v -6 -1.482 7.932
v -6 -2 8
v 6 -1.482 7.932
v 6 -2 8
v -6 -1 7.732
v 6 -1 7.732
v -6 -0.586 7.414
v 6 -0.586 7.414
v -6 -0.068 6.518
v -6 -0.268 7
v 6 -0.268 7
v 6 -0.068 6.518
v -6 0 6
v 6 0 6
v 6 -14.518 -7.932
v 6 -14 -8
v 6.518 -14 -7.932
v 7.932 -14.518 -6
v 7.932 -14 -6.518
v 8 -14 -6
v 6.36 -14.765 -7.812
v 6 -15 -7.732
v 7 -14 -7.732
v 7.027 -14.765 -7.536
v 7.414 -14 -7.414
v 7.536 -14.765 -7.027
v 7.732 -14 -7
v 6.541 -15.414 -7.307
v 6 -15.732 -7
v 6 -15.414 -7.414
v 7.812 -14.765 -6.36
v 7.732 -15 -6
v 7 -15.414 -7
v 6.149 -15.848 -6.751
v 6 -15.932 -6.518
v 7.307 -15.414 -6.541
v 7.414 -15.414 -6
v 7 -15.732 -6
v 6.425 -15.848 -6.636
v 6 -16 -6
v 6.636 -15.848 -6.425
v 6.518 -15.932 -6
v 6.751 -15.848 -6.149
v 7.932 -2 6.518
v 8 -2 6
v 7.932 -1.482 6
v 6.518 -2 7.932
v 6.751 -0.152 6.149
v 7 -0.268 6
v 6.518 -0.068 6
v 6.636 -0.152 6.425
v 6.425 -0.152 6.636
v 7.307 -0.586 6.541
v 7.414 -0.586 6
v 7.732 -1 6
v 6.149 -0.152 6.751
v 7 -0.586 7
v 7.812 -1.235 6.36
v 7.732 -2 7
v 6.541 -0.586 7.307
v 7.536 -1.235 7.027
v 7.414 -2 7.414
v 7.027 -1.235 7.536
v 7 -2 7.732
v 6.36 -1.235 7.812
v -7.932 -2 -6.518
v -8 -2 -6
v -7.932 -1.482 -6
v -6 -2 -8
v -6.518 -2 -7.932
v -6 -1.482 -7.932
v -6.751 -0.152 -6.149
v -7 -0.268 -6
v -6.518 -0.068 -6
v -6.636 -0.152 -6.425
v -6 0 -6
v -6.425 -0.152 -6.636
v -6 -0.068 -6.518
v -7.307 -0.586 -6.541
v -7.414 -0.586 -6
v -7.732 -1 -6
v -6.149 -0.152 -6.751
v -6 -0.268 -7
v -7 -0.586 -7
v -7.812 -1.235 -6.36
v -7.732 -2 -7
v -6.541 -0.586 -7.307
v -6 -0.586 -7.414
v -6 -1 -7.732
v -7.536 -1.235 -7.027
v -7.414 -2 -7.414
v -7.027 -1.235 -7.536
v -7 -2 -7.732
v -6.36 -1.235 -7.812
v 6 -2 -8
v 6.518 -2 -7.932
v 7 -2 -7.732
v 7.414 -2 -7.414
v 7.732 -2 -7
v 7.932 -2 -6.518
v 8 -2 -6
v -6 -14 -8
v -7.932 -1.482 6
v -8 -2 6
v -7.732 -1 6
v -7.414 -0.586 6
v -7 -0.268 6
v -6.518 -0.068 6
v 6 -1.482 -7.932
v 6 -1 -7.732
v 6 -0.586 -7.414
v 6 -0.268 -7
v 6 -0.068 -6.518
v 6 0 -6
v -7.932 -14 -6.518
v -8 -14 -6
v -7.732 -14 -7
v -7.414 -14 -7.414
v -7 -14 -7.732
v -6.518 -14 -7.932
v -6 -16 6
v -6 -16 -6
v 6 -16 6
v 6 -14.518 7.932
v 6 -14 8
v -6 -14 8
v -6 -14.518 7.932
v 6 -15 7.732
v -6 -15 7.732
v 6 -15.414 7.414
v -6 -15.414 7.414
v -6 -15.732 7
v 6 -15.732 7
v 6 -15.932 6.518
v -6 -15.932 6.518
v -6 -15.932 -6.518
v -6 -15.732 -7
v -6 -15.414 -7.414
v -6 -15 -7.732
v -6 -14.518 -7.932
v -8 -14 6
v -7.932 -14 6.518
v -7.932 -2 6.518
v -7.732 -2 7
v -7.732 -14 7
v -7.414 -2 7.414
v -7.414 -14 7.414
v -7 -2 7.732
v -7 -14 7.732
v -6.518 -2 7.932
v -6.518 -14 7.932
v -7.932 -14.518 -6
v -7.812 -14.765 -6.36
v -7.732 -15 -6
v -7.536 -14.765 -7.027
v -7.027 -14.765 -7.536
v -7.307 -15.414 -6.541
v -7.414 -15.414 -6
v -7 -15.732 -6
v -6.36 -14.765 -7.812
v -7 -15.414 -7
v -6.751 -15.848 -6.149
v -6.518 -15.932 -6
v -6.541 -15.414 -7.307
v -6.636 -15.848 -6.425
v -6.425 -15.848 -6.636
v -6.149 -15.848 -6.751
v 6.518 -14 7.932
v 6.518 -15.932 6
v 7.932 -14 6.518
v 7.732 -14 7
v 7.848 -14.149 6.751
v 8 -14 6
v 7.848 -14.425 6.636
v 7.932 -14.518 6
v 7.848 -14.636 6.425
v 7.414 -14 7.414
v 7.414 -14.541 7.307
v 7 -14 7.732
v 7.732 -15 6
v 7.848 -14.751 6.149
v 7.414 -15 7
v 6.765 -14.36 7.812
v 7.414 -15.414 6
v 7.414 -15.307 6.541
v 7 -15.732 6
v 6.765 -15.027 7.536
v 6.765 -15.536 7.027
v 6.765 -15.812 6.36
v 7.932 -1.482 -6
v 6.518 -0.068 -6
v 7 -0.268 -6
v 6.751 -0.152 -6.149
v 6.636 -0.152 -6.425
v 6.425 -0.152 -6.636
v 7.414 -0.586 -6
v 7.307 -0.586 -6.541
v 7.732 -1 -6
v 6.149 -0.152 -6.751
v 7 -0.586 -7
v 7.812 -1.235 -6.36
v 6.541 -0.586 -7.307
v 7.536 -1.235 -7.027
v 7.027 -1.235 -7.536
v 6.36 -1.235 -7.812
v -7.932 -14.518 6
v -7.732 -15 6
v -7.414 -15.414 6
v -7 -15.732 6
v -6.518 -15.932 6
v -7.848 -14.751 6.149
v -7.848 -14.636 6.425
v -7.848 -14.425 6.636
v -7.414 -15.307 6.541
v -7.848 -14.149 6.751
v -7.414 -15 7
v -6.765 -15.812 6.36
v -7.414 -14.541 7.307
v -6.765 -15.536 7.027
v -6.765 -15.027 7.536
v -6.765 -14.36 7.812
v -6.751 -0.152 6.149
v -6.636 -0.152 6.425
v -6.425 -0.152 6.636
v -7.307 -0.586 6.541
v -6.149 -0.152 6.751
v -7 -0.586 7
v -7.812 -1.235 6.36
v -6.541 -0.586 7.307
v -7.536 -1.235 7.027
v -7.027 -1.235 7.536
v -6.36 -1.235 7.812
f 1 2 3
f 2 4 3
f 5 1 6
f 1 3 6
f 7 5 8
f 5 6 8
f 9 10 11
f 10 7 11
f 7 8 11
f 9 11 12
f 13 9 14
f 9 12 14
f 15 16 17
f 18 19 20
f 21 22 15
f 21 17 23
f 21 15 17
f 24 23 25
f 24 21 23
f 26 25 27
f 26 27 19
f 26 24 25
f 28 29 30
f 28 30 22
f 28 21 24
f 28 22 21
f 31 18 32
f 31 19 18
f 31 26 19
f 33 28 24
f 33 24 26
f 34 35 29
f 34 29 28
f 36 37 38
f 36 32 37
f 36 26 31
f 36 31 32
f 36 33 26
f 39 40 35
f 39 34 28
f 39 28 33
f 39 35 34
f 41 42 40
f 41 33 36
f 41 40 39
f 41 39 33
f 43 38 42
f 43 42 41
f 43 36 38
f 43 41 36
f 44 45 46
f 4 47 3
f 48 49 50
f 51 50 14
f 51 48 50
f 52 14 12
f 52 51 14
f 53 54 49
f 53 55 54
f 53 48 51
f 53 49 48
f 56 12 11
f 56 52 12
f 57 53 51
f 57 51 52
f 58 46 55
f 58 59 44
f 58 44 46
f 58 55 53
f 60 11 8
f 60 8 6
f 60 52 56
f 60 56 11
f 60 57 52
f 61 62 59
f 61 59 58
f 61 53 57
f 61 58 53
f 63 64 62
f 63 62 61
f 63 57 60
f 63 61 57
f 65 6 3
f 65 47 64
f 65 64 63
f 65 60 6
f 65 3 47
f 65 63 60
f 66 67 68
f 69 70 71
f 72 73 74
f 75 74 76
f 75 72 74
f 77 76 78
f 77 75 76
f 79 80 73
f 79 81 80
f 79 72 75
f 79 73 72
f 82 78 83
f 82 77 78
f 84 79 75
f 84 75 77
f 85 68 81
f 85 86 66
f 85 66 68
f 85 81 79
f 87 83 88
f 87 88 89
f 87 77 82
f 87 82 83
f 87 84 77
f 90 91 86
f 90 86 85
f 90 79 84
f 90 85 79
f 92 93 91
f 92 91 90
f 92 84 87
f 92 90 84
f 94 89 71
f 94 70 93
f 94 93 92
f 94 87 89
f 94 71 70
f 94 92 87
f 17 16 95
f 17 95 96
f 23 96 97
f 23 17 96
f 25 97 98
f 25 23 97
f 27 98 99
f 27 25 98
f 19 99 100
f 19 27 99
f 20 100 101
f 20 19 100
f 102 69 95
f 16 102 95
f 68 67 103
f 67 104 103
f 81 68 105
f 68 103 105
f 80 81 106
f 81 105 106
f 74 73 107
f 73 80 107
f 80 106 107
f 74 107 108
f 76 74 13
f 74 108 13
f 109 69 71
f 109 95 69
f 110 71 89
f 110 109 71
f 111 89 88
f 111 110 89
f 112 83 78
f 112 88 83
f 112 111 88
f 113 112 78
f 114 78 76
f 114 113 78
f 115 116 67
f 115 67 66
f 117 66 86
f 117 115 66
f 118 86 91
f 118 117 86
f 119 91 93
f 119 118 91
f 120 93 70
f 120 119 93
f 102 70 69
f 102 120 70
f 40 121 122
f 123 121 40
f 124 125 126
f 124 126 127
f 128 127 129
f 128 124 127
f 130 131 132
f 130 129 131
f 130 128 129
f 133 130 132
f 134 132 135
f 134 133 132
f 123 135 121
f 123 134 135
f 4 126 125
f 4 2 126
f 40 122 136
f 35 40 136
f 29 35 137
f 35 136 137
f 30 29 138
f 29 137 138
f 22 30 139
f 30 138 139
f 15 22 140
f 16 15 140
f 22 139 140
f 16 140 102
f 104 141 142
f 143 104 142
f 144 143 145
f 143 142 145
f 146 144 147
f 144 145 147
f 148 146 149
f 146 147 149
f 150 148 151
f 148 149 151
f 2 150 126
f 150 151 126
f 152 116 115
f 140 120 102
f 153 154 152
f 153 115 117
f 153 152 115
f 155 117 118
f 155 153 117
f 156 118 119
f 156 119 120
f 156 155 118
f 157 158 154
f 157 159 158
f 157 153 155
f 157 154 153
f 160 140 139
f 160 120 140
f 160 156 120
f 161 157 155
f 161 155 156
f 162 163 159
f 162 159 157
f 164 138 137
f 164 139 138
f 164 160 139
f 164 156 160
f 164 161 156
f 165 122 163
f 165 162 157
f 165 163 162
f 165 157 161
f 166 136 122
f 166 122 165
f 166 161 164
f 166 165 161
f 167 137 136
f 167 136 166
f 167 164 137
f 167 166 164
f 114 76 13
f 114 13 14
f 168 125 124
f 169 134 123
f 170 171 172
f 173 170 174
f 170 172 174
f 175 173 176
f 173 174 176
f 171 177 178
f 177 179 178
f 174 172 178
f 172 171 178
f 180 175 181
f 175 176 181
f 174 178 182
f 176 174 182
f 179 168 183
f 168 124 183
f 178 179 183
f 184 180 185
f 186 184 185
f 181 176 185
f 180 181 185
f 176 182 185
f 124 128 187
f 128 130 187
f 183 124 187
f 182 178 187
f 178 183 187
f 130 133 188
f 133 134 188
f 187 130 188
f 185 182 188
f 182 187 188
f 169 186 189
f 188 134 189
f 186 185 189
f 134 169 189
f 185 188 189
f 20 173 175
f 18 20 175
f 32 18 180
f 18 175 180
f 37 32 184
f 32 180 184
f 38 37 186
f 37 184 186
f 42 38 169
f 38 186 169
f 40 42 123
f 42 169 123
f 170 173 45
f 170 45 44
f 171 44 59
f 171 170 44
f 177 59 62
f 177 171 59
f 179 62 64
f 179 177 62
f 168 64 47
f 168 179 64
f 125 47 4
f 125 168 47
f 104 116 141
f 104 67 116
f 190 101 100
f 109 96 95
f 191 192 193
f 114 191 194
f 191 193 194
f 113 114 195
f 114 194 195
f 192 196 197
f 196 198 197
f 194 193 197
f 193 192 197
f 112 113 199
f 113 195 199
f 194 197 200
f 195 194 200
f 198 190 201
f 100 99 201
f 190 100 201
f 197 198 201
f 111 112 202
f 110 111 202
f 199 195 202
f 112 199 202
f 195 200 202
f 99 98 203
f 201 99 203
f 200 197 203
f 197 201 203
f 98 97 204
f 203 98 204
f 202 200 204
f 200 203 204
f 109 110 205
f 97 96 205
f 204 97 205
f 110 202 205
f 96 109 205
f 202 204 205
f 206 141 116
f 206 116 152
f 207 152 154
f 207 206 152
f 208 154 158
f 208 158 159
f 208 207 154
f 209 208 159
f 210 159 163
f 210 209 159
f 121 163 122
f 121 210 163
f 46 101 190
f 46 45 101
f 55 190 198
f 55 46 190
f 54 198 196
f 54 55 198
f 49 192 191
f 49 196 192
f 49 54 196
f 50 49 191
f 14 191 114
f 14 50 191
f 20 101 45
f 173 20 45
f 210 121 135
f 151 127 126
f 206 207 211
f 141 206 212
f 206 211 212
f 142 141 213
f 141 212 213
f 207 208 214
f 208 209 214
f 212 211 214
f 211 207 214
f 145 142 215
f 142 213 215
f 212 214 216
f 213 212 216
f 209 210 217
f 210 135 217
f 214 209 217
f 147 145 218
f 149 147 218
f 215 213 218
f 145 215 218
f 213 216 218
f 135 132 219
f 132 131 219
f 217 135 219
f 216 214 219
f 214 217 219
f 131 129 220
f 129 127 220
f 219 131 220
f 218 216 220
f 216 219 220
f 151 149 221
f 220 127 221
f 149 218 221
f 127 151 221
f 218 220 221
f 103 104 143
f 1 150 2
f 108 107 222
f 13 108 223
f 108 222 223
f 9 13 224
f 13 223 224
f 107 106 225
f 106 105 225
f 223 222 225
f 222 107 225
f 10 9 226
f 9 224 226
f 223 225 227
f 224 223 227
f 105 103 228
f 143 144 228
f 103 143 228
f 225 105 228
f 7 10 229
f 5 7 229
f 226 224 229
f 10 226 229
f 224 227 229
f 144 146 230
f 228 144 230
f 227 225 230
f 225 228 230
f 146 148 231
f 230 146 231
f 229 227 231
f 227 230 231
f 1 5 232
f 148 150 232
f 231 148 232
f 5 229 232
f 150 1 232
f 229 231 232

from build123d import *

# Parameters (mm, degrees)
F0_W         = 16
F0_H         = 16
F1_DEPTH     = 16
F2_R         = 2
F3_T1_DEPTH  = 12
F3_S5_W      = 2
F3_S5_H      = 2
F3_T6_DEPTH  = 2
F3_S11_W     = 2
F3_S11_H     = 2
F3_T12_DEPTH = 2


# Not quite as in the source:
# - a fillet or chamfer that OpenCascade refuses, or shapes differently, is made with other operations: its cross-section is extruded or revolved along the edge and cut away or added


with BuildPart() as f1:
    # F0 (on Front) → F1 (new body)
    with BuildSketch(Plane.XZ):
        Rectangle(F0_W, F0_H)
    extrude(amount=F1_DEPTH)

    # F2
    f2_edges = [f1.edges().sort_by_distance(p)[0] for p in [
        (0, -16, 8),
        (8, -8, 8),
        (8, -8, -8),
        (-8, -16, 0),
        (8, 0, 0),
        (8, -16, 0),
        (-8, -8, -8),
        (-8, -8, 8),
        (-8, 0, 0),
        (0, 0, 8),
        (0, 0, -8),
    ]]
    fillet(f2_edges, radius=F2_R)

    # F3: fillet of radius 2 on 1 edges, made by hand

    # F3_s2 → F3_t1 (cut)
    with BuildSketch(Plane.YZ.offset(-6)):
        with BuildLine():
            ThreePointArc((-16, -6), (-15.4142135624, -7.4142135624), (-14, -8))
            Line((-14, -8), (-16, -8))
            Line((-16, -8), (-16, -6))
        make_face()
    extrude(amount=F3_T1_DEPTH, mode=Mode.SUBTRACT)


with BuildPart() as f3_tool4:
    # F3_s5 → F3_t6 (new body)
    with BuildSketch(Plane.XZ.offset(14)):
        with Locations((-7, -7)):
            Rectangle(F3_S5_W, F3_S5_H)
    extrude(amount=F3_T6_DEPTH)

    # F3_s7 → F3_t8 (revolve, cut)
    with BuildSketch(Plane(origin=(-6, -14, -6), x_dir=(0.7071067812, 0, 0.7071067812), z_dir=(0.7071067812, 0, -0.7071067812))):
        with BuildLine():
            ThreePointArc((0, -2), (2, 0), (0, 2))
            Line((0, 2), (0, -2))
        make_face()
    revolve(axis=Axis((-6, -14, -6), (0, -1, 0)), mode=Mode.SUBTRACT)


with BuildPart() as f1_1:
    add(f1.part)

    # F3_t3: cut F3_tool4
    add(f3_tool4.part, mode=Mode.SUBTRACT)


with BuildPart() as f3_tool10:
    # F3_s11 → F3_t12 (new body)
    with BuildSketch(Plane.XZ.offset(14)):
        with Locations((7, -7)):
            Rectangle(F3_S11_W, F3_S11_H)
    extrude(amount=F3_T12_DEPTH)

    # F3_s13 → F3_t14 (revolve, cut)
    with BuildSketch(Plane(origin=(6, -14, -6), x_dir=(-0.7071067812, 0, 0.7071067812), z_dir=(0.7071067812, 0, 0.7071067812))):
        with BuildLine():
            ThreePointArc((0, -2), (2, 0), (0, 2))
            Line((0, 2), (0, -2))
        make_face()
    revolve(axis=Axis((6, -14, -6), (0, -1, 0)), mode=Mode.SUBTRACT)


with BuildPart() as f1_2:
    add(f1_1.part)

    # F3_t9: cut F3_tool10
    add(f3_tool10.part, mode=Mode.SUBTRACT)


solid = f1_2.part
